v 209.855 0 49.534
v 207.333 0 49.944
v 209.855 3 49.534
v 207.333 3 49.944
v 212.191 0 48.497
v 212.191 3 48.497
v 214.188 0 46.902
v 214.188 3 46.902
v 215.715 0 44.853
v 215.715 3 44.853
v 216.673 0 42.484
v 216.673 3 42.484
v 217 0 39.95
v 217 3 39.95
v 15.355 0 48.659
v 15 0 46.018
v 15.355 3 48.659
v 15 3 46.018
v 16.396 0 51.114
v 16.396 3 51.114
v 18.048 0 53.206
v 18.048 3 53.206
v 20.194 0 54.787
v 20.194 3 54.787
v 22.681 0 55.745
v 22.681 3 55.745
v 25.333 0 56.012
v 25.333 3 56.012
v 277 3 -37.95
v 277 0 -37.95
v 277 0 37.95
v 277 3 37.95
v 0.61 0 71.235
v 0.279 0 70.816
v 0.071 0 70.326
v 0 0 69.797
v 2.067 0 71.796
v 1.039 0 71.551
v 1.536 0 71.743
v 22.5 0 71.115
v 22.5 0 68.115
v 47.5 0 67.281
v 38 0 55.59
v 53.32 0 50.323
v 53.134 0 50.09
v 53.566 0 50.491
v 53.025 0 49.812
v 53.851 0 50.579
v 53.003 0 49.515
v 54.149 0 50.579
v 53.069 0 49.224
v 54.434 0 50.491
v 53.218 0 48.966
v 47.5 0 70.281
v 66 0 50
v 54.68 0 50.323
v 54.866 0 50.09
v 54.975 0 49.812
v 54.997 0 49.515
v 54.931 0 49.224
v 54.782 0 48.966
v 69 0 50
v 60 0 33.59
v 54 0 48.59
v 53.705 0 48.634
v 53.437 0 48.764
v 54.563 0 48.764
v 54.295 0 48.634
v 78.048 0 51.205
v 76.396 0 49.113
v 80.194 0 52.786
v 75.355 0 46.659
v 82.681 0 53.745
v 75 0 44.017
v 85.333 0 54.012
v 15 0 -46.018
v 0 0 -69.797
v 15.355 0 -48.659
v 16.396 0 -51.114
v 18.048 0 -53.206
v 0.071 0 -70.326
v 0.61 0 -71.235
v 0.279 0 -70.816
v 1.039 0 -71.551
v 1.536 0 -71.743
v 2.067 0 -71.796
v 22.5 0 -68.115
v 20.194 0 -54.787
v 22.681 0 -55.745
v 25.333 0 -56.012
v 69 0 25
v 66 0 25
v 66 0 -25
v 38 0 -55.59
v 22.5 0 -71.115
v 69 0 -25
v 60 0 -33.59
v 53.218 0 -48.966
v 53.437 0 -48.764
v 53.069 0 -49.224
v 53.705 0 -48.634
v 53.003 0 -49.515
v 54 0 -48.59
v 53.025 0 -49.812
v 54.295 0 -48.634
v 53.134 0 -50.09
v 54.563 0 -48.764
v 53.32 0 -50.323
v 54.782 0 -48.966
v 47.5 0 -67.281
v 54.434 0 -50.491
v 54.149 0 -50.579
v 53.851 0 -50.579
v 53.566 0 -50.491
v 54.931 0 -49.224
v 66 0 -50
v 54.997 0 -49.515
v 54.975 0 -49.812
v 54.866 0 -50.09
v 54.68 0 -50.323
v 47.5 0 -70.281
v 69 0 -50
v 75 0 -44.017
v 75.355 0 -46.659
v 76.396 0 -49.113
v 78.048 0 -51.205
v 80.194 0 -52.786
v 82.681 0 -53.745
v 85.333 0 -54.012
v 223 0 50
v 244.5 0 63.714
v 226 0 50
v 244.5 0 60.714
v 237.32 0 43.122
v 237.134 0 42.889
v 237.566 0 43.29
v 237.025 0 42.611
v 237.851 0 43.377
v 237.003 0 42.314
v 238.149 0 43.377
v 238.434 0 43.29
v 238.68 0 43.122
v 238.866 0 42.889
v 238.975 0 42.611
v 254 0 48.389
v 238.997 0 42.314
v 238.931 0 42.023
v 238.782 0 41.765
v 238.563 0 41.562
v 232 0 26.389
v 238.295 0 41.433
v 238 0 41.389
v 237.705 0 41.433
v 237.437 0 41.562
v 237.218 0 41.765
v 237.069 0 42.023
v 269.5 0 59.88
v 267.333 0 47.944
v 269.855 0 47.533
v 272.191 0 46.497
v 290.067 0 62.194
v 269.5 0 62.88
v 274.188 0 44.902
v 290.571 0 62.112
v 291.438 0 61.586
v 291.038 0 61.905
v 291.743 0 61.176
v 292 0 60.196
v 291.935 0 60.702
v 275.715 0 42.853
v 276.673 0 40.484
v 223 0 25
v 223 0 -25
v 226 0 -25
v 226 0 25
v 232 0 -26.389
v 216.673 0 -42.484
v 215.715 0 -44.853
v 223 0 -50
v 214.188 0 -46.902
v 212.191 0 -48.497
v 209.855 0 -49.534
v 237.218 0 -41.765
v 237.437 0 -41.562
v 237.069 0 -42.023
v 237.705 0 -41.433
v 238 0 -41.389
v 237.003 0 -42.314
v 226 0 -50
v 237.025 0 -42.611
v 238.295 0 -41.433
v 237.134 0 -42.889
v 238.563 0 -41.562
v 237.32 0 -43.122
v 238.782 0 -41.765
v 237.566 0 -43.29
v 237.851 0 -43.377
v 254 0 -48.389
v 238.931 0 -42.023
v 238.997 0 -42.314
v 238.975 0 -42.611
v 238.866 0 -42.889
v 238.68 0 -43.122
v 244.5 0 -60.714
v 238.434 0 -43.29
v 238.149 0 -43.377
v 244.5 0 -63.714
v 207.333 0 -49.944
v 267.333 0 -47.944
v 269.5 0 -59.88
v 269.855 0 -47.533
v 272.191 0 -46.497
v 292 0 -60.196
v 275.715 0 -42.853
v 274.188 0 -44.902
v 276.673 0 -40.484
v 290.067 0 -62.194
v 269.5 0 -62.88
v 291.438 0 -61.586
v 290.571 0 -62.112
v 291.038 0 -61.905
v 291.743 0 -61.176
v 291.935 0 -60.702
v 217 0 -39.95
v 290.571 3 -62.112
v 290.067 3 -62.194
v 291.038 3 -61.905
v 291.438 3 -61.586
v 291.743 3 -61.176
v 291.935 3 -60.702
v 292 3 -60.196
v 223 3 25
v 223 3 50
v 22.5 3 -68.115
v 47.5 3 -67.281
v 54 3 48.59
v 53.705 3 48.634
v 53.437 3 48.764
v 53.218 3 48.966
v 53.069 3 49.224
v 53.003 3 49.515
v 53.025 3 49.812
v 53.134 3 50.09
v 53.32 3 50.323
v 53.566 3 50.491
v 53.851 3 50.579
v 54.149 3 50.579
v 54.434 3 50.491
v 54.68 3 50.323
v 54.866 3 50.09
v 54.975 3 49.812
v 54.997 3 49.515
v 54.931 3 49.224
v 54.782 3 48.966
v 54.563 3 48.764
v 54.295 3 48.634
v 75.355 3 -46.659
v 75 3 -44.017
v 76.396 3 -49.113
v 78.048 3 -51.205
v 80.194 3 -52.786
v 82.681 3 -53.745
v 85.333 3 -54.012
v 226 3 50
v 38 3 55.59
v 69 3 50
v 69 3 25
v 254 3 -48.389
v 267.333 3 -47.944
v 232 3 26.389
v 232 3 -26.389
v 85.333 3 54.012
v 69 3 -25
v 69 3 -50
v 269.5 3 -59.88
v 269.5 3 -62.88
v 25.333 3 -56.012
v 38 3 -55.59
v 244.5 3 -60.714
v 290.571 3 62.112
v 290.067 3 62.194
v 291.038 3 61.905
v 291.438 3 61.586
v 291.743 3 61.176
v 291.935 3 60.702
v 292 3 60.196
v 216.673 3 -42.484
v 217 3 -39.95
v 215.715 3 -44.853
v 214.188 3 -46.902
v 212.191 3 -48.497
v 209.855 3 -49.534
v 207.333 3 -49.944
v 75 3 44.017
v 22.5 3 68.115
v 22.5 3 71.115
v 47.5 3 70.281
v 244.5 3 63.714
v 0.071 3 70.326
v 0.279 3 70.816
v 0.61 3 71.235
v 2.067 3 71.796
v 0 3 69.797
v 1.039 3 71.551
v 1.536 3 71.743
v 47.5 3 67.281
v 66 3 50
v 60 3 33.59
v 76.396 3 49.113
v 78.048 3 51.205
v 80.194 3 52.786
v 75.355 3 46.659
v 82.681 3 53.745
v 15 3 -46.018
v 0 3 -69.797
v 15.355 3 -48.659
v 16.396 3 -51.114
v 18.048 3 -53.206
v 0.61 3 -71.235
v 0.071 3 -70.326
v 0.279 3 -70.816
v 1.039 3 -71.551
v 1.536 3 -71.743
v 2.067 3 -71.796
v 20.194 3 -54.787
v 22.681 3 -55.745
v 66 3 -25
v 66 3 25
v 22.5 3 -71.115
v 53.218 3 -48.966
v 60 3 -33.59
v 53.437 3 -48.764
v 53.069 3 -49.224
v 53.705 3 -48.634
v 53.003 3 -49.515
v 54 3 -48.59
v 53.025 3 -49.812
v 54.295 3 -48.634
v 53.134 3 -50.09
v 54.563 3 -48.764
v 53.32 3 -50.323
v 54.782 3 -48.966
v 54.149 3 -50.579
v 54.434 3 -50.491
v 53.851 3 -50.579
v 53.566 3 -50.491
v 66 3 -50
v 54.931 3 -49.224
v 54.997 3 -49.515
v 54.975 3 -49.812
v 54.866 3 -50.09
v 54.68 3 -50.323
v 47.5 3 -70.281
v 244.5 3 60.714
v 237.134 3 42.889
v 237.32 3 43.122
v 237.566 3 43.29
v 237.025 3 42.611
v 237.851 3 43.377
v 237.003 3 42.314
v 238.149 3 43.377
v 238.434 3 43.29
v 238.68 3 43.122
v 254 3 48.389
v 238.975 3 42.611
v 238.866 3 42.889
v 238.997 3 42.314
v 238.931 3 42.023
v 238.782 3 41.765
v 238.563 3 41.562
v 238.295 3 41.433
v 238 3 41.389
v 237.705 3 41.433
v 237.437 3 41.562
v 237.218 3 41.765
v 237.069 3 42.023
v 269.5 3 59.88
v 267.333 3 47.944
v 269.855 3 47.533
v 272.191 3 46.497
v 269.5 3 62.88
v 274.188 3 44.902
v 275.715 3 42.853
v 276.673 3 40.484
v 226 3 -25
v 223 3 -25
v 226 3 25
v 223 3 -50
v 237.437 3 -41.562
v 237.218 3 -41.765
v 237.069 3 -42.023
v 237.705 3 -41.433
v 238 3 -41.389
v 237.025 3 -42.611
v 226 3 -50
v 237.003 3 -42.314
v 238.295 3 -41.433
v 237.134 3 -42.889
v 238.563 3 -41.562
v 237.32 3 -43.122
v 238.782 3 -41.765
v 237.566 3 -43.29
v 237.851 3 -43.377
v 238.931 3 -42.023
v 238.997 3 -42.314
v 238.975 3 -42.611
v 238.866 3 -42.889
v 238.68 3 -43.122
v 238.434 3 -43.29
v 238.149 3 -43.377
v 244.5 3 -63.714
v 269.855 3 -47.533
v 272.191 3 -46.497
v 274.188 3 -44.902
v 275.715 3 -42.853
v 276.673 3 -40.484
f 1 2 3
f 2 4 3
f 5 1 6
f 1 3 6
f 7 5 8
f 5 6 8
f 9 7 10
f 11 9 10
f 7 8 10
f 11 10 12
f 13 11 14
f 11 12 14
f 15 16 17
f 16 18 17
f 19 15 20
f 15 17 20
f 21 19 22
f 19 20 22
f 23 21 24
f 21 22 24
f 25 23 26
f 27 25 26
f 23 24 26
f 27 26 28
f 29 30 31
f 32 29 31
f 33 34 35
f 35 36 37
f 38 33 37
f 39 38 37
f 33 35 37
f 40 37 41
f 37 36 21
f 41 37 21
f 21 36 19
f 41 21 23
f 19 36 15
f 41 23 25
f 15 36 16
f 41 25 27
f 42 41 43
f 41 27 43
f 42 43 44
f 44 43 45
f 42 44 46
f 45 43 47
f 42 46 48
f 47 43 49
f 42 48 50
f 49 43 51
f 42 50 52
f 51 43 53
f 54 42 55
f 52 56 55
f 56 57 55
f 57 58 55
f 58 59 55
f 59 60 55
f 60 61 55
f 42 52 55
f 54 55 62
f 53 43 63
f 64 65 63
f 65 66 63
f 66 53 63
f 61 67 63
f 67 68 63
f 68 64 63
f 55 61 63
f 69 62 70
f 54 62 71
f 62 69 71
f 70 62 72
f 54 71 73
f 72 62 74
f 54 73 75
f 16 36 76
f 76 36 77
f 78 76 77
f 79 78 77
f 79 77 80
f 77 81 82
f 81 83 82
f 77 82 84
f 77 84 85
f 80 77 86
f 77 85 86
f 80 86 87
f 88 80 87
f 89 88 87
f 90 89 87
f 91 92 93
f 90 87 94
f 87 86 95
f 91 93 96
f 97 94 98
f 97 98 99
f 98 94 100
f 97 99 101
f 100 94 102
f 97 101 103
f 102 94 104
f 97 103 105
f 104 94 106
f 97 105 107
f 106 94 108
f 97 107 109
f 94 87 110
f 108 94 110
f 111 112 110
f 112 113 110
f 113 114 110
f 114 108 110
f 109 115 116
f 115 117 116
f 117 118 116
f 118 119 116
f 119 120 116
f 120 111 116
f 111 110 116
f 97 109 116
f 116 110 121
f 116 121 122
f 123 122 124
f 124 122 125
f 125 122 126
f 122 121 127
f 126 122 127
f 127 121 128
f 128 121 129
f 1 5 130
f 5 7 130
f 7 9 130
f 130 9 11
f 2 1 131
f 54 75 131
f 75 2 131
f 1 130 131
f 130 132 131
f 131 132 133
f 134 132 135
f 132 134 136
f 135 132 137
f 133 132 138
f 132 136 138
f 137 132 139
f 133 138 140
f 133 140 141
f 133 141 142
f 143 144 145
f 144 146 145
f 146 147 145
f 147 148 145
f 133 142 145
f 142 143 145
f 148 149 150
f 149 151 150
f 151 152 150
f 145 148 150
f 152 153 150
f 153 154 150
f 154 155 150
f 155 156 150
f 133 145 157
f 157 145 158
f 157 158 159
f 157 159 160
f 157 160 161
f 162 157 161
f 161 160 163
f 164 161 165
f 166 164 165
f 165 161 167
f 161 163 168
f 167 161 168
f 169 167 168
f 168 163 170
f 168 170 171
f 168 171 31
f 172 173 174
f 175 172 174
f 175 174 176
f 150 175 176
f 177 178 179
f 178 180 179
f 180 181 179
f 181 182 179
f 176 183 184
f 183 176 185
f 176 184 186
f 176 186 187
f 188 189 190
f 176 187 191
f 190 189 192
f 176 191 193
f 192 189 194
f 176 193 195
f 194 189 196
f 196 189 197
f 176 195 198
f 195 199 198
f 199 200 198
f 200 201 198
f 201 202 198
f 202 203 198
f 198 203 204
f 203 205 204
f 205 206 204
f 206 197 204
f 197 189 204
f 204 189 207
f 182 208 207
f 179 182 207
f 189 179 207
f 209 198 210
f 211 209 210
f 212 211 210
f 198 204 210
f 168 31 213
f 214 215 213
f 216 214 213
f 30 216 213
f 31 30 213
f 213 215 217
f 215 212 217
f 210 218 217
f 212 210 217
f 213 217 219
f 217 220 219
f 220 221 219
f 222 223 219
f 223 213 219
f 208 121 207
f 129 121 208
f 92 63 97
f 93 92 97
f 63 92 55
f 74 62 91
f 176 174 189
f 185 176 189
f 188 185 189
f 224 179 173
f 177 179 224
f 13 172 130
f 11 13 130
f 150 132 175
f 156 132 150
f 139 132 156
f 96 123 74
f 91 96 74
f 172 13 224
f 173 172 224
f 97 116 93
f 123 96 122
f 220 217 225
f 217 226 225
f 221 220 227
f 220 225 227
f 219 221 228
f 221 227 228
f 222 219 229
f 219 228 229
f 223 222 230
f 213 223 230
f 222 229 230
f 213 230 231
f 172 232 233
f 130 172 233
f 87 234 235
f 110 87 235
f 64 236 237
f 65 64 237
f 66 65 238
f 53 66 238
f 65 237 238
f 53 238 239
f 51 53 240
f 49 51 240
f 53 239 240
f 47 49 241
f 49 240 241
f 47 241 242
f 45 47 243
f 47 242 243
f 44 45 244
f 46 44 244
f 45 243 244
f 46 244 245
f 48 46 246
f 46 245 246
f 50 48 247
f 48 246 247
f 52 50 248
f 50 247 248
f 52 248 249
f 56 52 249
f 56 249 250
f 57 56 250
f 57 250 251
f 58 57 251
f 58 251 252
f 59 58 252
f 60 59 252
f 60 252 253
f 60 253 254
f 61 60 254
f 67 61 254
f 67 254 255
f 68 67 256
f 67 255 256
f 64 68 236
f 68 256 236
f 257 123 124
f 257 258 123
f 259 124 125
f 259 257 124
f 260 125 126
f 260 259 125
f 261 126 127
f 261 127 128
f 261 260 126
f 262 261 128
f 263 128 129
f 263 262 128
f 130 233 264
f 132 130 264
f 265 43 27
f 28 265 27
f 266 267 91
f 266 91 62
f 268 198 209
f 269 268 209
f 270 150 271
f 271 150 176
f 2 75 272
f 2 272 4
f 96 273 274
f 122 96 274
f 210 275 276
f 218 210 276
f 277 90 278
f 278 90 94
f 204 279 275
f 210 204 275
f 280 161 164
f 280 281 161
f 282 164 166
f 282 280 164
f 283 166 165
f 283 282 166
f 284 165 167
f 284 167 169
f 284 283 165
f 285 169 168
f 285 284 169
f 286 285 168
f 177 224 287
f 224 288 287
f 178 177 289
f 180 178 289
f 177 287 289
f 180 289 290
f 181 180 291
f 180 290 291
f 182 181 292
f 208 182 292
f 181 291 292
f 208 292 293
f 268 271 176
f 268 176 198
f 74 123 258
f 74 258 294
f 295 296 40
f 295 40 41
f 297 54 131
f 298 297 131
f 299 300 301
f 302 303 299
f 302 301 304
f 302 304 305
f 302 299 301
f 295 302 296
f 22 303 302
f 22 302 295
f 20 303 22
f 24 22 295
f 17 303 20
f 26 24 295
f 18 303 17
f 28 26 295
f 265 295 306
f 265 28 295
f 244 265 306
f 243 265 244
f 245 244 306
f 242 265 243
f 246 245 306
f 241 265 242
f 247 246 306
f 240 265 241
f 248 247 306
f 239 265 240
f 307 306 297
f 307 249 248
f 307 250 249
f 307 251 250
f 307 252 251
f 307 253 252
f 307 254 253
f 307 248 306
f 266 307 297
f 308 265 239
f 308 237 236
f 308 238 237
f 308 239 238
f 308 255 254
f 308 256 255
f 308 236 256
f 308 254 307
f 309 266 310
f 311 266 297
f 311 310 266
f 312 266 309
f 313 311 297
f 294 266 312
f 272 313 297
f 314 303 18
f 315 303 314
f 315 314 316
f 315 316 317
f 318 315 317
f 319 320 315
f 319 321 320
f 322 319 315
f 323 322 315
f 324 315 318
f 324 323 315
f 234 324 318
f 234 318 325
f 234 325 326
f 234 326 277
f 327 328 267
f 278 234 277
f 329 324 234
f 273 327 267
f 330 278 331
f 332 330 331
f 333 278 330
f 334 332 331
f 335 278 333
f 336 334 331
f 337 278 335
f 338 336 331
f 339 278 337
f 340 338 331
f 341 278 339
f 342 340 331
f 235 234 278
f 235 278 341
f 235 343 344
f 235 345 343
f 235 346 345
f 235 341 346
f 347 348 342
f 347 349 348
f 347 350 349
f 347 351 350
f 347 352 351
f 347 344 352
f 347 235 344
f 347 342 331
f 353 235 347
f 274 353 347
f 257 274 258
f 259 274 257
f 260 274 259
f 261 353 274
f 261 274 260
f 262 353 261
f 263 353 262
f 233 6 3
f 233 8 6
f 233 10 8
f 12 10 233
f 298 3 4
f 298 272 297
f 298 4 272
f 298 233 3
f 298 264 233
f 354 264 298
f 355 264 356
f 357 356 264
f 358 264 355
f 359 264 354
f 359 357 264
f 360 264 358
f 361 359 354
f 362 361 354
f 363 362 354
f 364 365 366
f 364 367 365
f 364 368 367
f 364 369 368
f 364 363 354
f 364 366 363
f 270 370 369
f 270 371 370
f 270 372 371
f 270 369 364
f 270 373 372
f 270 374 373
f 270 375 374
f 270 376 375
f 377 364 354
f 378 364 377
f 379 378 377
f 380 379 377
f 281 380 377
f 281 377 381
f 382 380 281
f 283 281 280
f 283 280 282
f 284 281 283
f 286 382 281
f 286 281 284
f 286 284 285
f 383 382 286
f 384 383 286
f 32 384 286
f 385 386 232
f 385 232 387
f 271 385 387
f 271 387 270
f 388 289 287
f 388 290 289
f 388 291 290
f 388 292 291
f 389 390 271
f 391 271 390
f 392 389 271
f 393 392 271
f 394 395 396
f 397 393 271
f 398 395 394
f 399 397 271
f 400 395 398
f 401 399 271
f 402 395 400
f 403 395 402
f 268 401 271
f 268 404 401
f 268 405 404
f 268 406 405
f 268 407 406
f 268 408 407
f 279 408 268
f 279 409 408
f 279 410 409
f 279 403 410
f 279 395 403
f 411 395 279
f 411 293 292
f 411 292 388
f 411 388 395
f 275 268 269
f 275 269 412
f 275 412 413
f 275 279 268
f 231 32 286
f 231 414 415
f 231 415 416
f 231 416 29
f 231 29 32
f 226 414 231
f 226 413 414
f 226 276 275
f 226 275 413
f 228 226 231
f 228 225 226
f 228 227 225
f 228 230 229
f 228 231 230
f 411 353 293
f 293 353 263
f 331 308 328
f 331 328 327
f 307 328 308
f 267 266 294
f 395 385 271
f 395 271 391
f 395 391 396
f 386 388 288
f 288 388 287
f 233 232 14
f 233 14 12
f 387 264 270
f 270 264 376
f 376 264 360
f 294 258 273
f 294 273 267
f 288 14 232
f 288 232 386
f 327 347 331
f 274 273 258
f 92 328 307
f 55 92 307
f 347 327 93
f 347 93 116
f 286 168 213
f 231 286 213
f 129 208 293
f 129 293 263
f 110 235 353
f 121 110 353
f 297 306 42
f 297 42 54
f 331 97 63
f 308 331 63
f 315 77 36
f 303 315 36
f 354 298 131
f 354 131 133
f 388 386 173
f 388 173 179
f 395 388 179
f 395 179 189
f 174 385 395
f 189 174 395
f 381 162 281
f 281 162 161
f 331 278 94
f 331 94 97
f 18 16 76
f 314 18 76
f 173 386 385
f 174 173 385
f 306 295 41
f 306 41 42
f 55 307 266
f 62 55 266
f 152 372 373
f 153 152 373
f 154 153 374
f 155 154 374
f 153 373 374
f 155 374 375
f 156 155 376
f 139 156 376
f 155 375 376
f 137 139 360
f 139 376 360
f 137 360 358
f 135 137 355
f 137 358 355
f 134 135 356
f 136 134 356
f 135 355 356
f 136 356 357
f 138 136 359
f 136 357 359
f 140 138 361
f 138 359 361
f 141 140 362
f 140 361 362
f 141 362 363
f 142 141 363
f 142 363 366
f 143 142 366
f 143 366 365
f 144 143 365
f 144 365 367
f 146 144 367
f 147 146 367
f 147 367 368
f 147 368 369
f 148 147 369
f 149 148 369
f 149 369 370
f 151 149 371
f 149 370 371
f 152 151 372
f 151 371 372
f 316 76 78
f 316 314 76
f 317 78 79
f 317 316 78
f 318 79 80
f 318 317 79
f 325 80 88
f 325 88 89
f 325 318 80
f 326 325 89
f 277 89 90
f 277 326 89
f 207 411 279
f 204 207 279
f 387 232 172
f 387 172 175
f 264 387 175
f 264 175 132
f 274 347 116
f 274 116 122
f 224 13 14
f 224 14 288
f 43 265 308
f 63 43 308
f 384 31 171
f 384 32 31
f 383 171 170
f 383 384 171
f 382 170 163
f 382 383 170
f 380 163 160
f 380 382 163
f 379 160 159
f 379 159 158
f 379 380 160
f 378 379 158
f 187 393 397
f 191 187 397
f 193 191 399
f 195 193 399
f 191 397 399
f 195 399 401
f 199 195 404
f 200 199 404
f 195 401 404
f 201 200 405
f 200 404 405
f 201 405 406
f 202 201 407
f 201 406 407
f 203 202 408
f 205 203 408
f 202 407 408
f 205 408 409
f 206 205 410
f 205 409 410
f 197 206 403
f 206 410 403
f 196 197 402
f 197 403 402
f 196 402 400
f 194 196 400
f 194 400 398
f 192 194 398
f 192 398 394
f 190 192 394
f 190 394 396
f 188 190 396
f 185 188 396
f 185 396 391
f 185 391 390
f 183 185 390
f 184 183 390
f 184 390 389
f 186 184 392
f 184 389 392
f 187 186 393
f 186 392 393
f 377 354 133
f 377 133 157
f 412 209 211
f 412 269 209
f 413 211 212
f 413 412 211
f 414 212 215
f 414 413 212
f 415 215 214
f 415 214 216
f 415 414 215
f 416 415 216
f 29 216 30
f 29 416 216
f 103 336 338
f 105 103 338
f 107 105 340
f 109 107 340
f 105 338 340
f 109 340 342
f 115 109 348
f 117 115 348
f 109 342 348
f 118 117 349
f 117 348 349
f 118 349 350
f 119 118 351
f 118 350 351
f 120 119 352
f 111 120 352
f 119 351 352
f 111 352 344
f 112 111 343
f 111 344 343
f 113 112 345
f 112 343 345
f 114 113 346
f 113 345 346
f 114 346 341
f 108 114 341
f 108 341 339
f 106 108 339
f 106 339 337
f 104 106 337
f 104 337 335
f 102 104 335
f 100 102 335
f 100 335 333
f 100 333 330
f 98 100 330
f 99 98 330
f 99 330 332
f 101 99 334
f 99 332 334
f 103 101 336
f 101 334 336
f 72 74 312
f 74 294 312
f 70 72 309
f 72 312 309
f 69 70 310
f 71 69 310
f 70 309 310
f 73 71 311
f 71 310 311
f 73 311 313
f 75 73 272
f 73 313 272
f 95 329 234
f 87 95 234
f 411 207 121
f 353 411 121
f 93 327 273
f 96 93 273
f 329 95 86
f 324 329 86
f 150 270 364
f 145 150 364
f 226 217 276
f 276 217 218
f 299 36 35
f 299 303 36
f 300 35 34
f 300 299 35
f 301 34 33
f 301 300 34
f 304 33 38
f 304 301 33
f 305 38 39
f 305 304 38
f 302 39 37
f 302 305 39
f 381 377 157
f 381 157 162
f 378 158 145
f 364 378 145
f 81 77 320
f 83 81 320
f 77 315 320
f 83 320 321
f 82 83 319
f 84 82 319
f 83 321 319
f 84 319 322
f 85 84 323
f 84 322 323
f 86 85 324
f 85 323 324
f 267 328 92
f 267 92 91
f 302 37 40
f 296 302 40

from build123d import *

# Parameters (mm, degrees)
BOSS_EXTRUDE1_DEPTH = 3
FILLET1_R           = 2
FILLET2_R           = 10
SKETCH2_W           = 3
SKETCH2_H           = 25
CUT_EXTRUDE1_DEPTH  = 10
SKETCH3_R           = 1
BOSS_EXTRUDE2_DEPTH = 3


with BuildPart() as part:
    # Sketch1 → Boss-Extrude1 (new body)
    with BuildSketch(Plane(origin=(0, 0, 0), x_dir=(1, 0, 0), z_dir=(0, 1, 0))):
        Polygon((0, 71.865), (0, -71.865), (292, -62.13), (292, 62.13), align=None)
        Polygon((15, 56.356580511), (60, 54.856323662), (60, -54.856323662), (15, -56.356580511), align=None, mode=Mode.SUBTRACT)
        Polygon((277, 47.621751744), (277, -47.621751744), (232, -49.122008593), (232, 49.122008593), align=None, mode=Mode.SUBTRACT)
        Polygon((75, 54.356238045), (75, -54.356238045), (217, -49.62209421), (217, 49.62209421), align=None, mode=Mode.SUBTRACT)
    extrude(amount=BOSS_EXTRUDE1_DEPTH)

    # Fillet1
    fillet1_edges = [part.edges().sort_by_distance(p)[0] for p in [
        (0, 1.5, 71.865),
        (0, 1.5, -71.865),
        (292, 1.5, -62.13),
        (292, 1.5, 62.13),
    ]]
    fillet(fillet1_edges, radius=FILLET1_R)

    # Fillet2
    fillet2_edges = [part.edges().sort_by_distance(p)[0] for p in [
        (217, 1.5, -49.62209421),
        (75, 1.5, -54.356238045),
        (75, 1.5, 54.356238045),
        (217, 1.5, 49.62209421),
        (15, 1.5, -56.356580511),
        (15, 1.5, 56.356580511),
        (60, 1.5, 54.856323662),
        (60, 1.5, -54.856323662),
        (277, 1.5, -47.621751744),
        (232, 1.5, -49.122008593),
        (232, 1.5, 49.122008593),
        (277, 1.5, 47.621751744),
    ]]
    fillet(fillet2_edges, radius=FILLET2_R)

    # Sketch2 → Cut-Extrude1 (cut)
    with BuildSketch(Plane(origin=(0, 3, 0), x_dir=(1, 0, 0), z_dir=(0, 1, 0))):
        Polygon((47.5, 70.281395548), (22.5, 71.114871575), (22.5, 68.114871575), (47.5, 67.281395548), align=None)
        Polygon((269.5, 62.880128425), (244.5, 63.713604452), (244.5, 60.713604452), (269.5, 59.880128425), align=None)
        with Locations((67.5, 37.5)):
            Rectangle(SKETCH2_W, SKETCH2_H)
        with Locations((224.5, 37.5)):
            Rectangle(SKETCH2_W, SKETCH2_H)
    cut_extrude1 = extrude(amount=-CUT_EXTRUDE1_DEPTH, mode=Mode.SUBTRACT)

    # Mirror1: Cut-Extrude1 across plane
    add(cut_extrude1.mirror(Plane.XY), mode=Mode.SUBTRACT)

    # Sketch3 → Boss-Extrude2 (add)
    with BuildSketch(Plane(origin=(0, 3, 0), x_dir=(1, 0, 0), z_dir=(0, 1, 0))):
        Polygon((38, 55.589782566), (60, 33.589782566), (61.509816897, 56.691838505), align=None)
        with Locations(Location((54, 49.589782566, 0), (0, 0, 270))):
            Circle(SKETCH3_R, mode=Mode.SUBTRACT)
        Polygon((232, 26.388549689), (254, 48.388549689), (229.701692371, 51.044206748), align=None)
        with Locations(Location((238, 42.388549689, 0), (0, 0, 270))):
            Circle(SKETCH3_R, mode=Mode.SUBTRACT)
        Polygon((254, -48.388549689), (229.701692371, -51.044206748), (232, -26.388549689), align=None)
        with Locations(Location((238, -42.388549689, 0), (0, 0, 90))):
            Circle(SKETCH3_R, mode=Mode.SUBTRACT)
        Polygon((60, -33.589782566), (61.509816897, -56.691838505), (38, -55.589782566), align=None)
        with Locations(Location((54, -49.589782566, 0), (0, 0, 90))):
            Circle(SKETCH3_R, mode=Mode.SUBTRACT)
    extrude(amount=-BOSS_EXTRUDE2_DEPTH)


solid = part.part
